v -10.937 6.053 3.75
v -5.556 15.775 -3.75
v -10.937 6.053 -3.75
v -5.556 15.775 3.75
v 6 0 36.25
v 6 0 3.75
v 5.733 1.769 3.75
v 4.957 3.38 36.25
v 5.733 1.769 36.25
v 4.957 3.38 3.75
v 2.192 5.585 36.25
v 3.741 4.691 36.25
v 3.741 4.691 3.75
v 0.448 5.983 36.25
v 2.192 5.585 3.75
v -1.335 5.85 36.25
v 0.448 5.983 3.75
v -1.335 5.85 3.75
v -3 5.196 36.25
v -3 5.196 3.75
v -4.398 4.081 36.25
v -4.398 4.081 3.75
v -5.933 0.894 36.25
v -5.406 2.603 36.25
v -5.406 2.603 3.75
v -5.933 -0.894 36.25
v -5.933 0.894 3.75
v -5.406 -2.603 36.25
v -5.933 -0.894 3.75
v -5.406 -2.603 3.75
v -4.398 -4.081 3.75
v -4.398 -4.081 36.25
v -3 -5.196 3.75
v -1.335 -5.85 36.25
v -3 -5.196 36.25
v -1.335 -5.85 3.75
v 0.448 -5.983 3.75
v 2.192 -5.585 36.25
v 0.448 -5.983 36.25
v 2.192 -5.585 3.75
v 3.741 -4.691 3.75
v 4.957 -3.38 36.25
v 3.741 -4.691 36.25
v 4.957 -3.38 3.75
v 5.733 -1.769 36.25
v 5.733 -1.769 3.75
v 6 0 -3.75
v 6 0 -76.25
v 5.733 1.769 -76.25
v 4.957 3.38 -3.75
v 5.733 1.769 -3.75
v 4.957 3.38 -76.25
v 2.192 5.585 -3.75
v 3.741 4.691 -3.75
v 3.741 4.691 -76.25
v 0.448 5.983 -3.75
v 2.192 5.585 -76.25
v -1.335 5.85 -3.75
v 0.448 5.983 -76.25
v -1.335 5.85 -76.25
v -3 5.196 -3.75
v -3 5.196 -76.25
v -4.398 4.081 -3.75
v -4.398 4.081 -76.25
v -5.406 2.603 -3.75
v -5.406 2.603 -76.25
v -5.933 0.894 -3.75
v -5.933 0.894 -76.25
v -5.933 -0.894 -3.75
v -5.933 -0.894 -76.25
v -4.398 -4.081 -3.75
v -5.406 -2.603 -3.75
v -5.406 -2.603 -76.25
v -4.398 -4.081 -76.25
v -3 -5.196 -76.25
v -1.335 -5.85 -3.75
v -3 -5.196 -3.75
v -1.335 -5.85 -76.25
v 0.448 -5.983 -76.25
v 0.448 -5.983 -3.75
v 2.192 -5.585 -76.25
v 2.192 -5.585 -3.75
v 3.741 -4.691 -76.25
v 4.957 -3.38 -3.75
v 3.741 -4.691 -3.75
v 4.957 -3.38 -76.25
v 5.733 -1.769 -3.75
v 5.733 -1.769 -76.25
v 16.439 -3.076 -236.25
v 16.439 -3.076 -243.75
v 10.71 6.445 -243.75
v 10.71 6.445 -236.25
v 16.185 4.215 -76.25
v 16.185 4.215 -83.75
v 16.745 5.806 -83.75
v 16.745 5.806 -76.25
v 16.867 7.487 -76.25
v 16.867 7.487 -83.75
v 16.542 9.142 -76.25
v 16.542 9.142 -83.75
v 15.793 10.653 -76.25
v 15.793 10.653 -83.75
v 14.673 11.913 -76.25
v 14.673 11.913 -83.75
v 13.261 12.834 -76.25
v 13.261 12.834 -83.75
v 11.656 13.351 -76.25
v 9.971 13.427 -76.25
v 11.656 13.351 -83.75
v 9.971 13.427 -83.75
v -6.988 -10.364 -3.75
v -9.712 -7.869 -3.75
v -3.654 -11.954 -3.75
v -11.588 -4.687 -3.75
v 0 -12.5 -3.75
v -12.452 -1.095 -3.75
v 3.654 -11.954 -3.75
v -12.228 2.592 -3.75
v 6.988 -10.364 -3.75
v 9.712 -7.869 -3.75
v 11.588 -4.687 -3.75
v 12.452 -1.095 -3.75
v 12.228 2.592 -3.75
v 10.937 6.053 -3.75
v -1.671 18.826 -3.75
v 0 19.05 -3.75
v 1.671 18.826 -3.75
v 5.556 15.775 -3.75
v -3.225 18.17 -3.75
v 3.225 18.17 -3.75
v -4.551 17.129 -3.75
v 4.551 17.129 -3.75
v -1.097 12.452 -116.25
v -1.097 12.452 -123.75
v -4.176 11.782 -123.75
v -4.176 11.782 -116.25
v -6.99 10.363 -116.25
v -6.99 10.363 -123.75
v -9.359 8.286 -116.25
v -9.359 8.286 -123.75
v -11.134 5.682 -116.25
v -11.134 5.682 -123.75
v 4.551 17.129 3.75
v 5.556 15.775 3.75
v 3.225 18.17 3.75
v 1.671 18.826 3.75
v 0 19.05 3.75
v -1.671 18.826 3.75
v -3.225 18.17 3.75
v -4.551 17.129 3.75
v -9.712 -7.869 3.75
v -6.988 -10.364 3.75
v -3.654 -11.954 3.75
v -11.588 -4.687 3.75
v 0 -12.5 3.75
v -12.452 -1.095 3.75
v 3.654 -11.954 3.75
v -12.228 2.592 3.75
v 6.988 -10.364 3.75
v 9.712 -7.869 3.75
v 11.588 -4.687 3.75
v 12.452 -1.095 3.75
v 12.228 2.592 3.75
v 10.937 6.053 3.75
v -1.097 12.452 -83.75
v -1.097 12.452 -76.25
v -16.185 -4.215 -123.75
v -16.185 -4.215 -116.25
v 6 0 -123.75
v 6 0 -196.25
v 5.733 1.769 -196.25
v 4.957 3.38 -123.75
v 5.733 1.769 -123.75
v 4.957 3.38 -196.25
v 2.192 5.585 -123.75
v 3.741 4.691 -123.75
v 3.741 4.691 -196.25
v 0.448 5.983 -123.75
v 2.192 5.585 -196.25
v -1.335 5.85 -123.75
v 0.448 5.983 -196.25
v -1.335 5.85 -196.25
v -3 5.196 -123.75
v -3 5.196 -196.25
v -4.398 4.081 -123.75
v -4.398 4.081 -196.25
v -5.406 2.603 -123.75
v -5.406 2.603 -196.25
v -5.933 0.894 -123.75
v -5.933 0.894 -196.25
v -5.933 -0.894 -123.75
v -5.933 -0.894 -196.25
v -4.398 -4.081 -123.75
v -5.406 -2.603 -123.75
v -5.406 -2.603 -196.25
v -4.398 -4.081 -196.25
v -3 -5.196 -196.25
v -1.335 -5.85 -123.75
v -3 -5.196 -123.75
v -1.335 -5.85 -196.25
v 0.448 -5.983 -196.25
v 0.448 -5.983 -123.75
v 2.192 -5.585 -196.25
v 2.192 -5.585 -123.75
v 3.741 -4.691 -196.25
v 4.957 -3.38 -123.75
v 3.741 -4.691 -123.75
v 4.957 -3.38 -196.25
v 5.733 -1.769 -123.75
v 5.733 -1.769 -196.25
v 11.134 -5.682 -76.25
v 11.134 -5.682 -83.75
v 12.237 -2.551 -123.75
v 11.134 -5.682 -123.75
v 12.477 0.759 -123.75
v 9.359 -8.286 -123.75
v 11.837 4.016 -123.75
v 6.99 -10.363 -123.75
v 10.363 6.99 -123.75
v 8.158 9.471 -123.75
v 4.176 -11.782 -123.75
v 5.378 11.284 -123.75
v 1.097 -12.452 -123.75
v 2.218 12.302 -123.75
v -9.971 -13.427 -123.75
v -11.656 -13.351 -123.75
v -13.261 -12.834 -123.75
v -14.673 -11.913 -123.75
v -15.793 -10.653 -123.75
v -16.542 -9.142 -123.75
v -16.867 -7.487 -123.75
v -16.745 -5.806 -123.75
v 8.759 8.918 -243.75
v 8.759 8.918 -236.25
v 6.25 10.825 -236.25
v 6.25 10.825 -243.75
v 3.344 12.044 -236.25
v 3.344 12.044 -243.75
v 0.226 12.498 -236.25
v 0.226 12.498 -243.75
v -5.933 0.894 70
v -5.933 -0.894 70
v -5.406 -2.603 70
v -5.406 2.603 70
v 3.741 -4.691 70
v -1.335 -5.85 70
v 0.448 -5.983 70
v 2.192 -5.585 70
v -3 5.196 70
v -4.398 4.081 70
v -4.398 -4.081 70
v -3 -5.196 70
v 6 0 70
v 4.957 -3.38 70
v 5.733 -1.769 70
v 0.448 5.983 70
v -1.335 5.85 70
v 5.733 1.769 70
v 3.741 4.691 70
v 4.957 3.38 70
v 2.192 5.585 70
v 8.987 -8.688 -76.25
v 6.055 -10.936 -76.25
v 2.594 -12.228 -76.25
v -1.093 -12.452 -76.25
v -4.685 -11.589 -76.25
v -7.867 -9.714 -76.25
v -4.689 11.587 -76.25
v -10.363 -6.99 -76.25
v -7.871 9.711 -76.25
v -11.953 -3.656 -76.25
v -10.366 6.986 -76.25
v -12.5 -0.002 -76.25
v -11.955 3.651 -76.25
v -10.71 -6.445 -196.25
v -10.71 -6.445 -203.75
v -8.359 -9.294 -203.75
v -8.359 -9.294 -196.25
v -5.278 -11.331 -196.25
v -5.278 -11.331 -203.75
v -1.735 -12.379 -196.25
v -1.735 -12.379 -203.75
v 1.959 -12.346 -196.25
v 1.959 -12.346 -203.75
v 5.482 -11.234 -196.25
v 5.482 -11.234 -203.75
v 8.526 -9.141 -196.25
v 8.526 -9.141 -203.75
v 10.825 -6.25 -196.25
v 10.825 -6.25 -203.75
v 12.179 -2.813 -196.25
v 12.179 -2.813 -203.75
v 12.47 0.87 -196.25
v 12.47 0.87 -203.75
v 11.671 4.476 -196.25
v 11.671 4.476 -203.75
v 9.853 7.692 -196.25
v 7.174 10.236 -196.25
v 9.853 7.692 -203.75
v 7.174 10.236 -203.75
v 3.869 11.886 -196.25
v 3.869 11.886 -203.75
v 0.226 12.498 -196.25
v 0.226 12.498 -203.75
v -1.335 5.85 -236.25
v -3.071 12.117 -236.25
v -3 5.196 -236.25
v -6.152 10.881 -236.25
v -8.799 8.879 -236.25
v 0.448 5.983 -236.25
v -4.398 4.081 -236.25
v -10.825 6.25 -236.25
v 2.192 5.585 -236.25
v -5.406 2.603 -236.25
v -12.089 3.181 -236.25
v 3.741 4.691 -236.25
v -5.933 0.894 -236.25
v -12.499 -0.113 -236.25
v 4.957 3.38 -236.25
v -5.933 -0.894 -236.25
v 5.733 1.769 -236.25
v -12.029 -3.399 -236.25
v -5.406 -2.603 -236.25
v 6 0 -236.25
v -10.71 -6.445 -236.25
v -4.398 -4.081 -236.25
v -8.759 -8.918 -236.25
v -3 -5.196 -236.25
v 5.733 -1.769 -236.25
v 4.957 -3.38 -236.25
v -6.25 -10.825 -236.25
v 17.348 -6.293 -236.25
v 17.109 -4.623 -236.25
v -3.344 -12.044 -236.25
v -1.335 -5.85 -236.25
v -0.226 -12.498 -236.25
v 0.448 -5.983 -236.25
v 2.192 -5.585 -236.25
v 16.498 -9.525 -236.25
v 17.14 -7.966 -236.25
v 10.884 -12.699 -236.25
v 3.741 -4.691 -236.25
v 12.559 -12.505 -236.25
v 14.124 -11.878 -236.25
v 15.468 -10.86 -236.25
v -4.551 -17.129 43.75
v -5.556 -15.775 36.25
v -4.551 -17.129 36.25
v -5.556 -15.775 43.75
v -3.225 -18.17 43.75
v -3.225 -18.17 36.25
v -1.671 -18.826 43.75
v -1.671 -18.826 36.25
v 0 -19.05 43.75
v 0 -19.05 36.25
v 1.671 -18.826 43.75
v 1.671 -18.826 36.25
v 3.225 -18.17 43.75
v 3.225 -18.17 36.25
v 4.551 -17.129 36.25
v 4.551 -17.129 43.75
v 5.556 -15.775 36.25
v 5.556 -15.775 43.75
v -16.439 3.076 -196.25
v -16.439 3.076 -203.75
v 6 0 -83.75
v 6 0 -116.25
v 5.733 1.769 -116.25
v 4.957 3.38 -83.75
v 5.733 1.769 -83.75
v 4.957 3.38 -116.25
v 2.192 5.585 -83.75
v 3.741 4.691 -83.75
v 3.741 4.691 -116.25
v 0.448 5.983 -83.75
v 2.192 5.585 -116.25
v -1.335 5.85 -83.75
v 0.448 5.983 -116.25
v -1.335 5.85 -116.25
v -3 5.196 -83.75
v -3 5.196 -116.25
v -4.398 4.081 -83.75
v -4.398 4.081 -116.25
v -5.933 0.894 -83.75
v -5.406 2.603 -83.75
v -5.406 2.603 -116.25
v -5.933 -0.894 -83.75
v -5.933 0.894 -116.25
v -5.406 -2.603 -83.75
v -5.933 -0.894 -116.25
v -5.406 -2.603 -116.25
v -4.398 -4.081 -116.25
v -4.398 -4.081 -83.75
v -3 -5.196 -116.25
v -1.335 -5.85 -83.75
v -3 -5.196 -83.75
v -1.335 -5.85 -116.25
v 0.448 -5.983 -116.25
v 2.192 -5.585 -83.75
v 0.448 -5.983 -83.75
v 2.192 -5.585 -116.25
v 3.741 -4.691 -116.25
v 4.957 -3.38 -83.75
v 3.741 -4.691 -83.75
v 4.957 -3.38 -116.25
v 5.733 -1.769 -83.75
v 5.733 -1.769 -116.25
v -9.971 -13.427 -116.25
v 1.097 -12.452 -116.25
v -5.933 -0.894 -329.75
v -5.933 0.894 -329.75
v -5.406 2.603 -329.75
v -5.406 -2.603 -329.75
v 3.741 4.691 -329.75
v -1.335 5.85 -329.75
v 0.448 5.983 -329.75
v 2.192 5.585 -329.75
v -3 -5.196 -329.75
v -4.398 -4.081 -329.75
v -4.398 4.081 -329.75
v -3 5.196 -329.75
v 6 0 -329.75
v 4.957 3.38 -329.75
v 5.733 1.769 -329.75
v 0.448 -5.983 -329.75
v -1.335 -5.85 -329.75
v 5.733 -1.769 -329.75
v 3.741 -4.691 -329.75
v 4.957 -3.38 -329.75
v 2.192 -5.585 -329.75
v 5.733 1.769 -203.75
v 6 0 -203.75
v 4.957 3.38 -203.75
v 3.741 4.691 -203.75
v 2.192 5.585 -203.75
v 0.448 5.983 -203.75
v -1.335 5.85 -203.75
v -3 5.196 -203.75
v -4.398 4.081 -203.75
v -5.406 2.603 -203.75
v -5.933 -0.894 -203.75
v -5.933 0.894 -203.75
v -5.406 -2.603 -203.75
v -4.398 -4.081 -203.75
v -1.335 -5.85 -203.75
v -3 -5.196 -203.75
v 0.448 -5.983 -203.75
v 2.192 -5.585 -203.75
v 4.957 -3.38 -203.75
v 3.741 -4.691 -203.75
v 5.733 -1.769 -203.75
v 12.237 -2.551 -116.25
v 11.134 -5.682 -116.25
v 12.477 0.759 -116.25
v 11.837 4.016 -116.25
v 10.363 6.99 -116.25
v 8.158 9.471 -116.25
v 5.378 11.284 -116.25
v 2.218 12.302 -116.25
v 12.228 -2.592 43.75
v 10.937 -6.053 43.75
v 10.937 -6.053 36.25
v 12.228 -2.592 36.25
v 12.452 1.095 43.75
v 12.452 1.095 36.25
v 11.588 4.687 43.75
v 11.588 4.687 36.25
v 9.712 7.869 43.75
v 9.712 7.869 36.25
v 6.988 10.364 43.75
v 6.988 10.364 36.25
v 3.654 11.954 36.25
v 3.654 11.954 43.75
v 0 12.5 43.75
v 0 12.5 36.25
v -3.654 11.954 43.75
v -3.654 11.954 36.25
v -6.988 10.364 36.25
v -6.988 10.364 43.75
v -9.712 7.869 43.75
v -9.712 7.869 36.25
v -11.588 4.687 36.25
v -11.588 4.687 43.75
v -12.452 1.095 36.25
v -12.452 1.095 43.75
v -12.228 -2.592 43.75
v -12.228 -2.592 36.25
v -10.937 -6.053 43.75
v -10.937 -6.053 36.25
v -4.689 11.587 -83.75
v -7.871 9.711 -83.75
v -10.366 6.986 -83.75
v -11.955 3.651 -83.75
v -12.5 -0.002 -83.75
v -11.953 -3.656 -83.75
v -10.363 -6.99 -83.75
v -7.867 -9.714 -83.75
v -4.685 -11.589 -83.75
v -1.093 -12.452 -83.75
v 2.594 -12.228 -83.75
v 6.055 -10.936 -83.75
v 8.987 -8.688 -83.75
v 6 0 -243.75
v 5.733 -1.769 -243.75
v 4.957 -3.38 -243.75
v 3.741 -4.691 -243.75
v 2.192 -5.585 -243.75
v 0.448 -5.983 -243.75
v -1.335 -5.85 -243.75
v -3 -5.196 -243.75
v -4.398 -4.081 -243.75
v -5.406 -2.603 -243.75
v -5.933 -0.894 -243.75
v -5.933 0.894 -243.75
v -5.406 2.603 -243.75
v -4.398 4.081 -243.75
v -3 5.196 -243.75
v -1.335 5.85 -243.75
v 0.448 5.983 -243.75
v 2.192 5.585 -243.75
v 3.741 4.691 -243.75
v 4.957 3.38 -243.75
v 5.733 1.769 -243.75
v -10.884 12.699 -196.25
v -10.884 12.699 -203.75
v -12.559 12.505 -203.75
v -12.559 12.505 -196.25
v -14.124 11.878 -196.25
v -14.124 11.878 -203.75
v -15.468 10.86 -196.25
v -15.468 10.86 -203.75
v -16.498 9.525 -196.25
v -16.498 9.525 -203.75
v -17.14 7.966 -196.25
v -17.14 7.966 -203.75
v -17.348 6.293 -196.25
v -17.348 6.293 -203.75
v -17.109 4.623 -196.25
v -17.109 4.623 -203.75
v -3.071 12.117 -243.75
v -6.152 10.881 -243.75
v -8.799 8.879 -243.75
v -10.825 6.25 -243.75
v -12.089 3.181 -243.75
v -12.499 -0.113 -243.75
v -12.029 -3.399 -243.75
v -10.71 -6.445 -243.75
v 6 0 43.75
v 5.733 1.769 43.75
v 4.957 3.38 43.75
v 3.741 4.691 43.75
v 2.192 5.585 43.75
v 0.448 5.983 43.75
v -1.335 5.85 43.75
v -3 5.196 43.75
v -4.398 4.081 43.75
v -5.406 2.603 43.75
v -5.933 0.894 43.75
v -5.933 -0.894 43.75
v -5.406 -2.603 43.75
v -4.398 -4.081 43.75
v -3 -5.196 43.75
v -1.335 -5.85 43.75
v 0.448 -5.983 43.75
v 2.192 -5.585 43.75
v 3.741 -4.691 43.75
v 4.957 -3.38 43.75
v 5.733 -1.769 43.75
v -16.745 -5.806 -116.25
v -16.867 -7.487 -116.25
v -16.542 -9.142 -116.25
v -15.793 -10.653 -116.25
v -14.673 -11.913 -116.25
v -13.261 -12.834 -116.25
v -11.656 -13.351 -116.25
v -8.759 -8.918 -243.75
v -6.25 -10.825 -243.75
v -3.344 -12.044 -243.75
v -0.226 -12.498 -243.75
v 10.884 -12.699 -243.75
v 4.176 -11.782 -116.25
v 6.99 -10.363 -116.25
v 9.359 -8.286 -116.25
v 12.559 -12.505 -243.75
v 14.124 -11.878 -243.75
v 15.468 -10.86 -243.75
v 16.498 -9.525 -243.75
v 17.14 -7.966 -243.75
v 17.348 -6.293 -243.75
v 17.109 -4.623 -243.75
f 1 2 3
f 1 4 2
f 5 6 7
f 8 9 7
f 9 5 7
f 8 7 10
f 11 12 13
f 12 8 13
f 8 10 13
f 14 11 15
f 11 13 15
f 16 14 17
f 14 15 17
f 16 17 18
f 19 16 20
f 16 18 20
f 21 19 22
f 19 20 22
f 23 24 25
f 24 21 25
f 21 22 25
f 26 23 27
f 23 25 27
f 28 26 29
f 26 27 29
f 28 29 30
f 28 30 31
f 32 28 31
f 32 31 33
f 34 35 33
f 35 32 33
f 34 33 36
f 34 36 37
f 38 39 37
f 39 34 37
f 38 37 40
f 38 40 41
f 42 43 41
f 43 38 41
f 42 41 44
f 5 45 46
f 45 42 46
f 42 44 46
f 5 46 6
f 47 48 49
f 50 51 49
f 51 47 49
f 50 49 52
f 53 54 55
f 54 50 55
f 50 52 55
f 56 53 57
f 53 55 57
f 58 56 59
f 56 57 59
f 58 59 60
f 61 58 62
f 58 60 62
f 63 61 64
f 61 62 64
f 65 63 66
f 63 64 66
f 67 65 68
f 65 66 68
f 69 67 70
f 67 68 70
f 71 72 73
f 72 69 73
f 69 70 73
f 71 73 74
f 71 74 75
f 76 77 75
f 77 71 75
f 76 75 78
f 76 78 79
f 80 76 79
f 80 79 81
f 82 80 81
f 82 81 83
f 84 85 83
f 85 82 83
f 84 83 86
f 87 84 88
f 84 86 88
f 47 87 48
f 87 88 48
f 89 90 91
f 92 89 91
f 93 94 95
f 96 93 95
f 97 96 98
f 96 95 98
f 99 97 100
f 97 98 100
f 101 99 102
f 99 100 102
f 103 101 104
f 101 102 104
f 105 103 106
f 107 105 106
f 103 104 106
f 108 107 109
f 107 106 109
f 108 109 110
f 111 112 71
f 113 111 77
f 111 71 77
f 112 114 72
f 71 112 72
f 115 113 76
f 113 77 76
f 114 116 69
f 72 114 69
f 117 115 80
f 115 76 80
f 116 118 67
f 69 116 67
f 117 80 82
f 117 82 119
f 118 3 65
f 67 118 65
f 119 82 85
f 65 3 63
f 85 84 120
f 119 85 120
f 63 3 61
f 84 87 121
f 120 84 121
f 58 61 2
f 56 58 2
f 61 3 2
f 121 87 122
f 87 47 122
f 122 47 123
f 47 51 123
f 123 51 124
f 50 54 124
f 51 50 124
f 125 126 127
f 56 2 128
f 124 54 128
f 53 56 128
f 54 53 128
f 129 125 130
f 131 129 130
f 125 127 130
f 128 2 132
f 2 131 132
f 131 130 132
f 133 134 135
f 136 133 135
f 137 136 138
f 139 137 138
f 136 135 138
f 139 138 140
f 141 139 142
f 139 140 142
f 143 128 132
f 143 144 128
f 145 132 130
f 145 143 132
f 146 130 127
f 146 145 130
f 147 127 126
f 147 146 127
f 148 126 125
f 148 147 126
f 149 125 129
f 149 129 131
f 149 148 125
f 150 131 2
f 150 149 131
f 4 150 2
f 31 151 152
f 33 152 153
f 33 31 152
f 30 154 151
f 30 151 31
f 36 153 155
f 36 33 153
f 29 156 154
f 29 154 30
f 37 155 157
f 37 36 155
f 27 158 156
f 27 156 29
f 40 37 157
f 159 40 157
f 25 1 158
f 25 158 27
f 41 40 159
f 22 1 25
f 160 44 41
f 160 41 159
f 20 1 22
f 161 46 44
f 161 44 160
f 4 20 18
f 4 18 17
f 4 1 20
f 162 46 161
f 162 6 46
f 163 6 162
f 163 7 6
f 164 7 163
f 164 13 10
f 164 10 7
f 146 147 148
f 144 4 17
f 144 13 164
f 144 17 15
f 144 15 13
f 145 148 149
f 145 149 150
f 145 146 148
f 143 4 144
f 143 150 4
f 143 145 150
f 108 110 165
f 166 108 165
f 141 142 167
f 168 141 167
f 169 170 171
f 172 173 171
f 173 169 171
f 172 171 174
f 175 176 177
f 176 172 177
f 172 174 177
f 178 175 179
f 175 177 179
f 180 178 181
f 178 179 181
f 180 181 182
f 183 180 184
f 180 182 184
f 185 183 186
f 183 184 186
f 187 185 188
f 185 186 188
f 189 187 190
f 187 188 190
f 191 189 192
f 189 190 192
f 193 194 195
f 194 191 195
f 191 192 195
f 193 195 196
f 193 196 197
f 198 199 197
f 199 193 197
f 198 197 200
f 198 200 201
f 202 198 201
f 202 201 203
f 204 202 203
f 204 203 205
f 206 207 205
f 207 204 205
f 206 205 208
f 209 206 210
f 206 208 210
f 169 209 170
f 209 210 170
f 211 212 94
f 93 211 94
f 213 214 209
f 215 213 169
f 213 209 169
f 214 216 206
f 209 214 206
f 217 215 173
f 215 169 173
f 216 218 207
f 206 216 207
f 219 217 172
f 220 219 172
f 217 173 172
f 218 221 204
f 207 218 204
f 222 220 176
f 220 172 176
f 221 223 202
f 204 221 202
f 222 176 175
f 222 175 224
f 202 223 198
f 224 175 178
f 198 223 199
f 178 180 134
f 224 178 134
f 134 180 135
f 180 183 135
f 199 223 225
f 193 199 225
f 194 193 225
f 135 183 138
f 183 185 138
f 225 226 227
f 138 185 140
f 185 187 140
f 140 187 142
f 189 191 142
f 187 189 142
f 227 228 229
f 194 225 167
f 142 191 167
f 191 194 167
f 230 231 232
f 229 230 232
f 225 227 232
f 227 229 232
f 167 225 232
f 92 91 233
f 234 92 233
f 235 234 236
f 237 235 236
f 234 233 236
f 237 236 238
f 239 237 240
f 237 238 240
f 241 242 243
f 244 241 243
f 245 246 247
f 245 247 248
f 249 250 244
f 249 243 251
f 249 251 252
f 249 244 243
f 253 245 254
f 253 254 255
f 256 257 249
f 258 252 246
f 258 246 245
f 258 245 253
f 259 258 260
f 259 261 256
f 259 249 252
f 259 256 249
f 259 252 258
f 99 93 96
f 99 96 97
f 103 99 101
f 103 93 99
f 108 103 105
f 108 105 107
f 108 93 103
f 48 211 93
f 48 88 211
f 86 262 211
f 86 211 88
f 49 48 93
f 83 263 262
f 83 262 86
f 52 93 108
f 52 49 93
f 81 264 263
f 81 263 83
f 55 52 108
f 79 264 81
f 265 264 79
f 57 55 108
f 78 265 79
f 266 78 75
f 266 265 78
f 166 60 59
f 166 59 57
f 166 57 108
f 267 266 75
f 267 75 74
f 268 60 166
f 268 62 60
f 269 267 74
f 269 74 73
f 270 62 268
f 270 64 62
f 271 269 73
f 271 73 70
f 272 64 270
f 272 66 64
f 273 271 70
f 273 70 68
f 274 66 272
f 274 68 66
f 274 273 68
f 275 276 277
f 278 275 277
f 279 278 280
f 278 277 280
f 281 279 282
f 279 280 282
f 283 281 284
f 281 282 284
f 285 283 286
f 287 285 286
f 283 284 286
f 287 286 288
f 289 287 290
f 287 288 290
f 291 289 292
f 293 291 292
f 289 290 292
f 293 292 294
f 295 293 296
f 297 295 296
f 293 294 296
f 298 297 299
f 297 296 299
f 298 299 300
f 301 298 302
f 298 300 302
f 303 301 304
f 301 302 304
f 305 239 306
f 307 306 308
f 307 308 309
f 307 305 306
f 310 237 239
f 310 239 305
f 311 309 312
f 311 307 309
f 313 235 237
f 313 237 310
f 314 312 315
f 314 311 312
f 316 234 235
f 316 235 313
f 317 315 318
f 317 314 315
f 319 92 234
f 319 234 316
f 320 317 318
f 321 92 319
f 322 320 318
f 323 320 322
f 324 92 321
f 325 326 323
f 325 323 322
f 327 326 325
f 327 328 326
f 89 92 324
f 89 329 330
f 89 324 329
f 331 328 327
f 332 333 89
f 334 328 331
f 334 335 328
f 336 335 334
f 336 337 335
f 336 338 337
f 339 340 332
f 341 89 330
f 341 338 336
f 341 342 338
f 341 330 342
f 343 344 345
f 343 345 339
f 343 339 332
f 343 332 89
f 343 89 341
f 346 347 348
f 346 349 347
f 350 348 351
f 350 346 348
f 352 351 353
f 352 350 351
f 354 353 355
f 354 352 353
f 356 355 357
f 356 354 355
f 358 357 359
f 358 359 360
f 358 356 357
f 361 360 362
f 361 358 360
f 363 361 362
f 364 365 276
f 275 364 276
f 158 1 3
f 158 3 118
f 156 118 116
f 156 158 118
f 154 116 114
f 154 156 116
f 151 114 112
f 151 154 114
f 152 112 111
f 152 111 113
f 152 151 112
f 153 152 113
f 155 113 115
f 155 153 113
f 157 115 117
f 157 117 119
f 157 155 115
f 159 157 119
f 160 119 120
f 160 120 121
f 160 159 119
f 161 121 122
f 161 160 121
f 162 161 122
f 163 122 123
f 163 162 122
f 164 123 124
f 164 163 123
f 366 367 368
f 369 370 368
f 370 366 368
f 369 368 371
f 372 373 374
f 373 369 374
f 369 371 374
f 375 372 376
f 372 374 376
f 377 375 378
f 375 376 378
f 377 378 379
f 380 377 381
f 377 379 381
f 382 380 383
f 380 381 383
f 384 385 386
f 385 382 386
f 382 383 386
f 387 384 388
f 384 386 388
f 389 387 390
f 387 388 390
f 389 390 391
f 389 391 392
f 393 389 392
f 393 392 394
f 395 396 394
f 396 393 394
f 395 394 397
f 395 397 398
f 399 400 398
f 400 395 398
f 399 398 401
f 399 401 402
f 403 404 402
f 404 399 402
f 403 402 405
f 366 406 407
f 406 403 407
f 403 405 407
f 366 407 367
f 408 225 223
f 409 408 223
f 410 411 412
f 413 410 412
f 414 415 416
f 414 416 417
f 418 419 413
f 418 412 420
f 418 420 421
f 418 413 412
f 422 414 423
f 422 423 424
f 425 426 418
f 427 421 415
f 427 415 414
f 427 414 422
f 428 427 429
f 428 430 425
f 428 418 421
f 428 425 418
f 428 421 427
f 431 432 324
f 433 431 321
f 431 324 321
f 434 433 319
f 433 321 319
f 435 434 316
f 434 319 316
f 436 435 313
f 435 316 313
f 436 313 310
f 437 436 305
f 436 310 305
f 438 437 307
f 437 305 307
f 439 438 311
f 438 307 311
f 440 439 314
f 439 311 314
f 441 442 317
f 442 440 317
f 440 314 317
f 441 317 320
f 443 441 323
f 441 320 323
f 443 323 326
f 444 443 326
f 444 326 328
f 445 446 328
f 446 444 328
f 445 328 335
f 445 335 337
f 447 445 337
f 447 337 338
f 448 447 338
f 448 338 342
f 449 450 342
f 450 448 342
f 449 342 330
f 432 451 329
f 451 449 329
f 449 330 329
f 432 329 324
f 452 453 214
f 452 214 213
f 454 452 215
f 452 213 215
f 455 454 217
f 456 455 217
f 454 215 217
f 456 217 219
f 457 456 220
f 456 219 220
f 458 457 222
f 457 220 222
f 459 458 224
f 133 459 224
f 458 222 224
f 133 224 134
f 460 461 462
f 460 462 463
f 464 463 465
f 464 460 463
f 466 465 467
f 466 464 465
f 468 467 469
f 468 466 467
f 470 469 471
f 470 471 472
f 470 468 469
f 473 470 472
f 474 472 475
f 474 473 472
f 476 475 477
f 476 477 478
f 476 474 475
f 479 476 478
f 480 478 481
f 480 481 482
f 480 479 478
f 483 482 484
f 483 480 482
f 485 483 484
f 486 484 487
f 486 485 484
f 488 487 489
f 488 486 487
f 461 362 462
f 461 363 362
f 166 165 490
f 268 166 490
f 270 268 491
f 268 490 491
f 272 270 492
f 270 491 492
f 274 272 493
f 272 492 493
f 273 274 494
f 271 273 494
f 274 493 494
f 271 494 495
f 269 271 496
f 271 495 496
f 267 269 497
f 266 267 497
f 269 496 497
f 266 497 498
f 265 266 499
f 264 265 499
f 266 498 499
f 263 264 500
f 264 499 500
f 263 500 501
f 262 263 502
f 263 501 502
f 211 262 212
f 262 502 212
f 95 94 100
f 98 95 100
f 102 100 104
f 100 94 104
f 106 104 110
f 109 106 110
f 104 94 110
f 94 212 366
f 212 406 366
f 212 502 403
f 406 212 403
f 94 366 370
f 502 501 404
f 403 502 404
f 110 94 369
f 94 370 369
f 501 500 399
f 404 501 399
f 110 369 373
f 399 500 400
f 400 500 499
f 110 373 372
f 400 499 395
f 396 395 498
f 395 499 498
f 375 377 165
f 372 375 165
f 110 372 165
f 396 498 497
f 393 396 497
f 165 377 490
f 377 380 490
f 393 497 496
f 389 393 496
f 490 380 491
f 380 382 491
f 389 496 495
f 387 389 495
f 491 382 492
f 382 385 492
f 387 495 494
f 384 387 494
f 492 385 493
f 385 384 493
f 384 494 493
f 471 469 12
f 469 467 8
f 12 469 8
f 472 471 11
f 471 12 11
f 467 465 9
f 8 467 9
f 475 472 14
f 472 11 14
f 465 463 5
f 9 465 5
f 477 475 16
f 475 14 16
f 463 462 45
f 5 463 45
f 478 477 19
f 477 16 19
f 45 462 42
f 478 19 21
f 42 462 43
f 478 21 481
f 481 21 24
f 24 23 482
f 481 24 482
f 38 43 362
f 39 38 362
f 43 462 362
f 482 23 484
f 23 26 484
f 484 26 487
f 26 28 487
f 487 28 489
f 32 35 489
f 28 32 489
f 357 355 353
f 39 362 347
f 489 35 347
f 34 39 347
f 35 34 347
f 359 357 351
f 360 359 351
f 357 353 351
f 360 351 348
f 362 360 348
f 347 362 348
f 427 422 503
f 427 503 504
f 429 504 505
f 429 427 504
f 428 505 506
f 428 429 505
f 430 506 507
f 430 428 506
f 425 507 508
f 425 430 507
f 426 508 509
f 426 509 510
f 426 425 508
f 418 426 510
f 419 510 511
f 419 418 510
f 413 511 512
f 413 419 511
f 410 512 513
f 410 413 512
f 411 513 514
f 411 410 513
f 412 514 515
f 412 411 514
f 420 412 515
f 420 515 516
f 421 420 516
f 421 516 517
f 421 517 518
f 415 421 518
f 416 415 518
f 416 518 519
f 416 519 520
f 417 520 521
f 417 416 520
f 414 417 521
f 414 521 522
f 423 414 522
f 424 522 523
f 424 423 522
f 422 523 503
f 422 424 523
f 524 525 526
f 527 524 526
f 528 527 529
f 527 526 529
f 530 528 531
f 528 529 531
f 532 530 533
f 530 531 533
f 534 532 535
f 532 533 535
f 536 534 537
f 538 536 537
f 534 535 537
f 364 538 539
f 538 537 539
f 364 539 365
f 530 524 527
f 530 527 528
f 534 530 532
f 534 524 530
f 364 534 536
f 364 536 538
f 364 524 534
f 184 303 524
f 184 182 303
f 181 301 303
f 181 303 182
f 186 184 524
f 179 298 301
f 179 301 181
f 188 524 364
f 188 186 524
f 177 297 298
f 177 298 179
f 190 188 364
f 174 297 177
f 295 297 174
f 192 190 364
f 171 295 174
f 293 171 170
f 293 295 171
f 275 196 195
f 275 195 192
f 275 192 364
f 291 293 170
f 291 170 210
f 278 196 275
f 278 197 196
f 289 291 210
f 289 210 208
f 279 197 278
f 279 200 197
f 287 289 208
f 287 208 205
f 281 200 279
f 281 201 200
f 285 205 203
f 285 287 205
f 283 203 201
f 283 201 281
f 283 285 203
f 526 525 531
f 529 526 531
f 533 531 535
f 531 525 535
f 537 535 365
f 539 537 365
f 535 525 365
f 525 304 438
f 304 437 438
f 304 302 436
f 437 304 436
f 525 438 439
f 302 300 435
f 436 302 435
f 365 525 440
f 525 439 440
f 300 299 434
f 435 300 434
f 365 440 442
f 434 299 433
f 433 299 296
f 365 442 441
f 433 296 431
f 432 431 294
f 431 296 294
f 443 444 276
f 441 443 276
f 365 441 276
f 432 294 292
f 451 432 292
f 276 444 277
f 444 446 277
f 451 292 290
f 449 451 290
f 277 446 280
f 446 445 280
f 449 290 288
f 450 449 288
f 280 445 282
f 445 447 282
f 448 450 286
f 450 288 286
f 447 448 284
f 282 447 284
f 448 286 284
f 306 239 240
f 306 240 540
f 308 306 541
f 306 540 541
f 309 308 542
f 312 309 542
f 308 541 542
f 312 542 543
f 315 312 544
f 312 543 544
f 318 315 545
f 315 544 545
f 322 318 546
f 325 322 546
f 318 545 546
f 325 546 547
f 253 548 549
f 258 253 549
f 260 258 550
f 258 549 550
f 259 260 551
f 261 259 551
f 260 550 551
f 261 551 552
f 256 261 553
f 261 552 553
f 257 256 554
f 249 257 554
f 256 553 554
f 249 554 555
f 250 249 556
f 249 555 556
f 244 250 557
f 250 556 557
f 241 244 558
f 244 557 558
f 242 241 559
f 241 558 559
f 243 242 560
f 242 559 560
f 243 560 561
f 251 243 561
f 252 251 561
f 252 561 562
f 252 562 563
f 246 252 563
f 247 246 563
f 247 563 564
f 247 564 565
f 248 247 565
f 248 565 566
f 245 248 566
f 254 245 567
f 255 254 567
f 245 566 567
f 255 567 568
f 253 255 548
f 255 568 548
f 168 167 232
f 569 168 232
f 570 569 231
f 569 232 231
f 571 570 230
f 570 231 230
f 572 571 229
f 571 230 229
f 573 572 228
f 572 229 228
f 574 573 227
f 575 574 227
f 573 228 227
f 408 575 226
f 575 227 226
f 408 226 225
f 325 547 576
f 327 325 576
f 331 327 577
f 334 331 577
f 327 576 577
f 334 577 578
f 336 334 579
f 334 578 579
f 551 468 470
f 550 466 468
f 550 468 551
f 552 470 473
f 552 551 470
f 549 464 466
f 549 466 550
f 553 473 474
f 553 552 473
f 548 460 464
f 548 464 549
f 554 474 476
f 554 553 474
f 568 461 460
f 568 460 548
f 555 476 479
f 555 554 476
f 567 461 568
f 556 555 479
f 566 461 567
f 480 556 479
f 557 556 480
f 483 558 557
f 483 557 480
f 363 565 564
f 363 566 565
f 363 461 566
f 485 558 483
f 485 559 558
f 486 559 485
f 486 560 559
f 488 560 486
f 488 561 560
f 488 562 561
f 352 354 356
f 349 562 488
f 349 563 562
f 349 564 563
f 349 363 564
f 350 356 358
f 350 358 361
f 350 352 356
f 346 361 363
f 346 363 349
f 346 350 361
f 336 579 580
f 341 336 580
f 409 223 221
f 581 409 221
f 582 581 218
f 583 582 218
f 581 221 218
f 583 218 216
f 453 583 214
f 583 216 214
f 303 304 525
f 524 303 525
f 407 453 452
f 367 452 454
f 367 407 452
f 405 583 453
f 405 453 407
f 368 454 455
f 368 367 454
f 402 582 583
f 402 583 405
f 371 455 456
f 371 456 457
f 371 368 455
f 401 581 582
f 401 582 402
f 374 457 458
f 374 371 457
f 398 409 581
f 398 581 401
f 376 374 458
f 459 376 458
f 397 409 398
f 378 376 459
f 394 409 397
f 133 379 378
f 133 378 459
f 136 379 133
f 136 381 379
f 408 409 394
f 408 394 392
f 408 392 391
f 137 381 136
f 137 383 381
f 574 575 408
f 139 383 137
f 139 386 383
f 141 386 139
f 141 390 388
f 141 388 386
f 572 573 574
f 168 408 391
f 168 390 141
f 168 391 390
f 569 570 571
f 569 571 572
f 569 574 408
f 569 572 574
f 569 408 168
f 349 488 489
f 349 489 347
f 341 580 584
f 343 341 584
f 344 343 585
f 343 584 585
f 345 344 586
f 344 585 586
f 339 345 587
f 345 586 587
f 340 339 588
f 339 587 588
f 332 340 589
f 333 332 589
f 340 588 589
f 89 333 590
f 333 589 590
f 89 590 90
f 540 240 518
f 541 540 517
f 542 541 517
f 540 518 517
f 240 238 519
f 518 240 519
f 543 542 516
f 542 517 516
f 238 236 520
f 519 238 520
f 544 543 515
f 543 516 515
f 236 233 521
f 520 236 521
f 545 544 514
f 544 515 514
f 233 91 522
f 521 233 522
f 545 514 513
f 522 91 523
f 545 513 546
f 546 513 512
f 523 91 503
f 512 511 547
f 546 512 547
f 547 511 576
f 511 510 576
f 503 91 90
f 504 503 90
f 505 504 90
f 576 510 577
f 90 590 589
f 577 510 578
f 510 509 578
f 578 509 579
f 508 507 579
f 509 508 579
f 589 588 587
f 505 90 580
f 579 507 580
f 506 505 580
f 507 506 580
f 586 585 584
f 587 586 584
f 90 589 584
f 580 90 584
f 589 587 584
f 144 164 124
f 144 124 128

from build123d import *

# Parameters (mm, degrees)
SALIENTE_EXTRUIR1_DEPTH      = 3.75
S_LIDO_MOVER_COPIAR2_ANGLE   = 180
S_LIDO_MOVER_COPIAR4_START   = -243.75
S_LIDO_MOVER_COPIAR4_DEPTH   = 7.5
S_LIDO_MOVER_COPIAR4_START_2 = -203.75
S_LIDO_MOVER_COPIAR4_2_DEPTH = 7.5
S_LIDO_MOVER_COPIAR4_START_3 = -123.75
S_LIDO_MOVER_COPIAR4_3_DEPTH = 7.5
S_LIDO_MOVER_COPIAR4_START_4 = -83.75
S_LIDO_MOVER_COPIAR4_4_DEPTH = 7.5
S_LIDO_MOVER_COPIAR5_ANGLE   = 124
S_LIDO_MOVER_COPIAR6_ANGLE   = 120
CROQUIS5_R                   = 6
SALIENTE_EXTRUIR4_DEPTH      = 275
SALIENTE_EXTRUIR5_START      = 86
CROQUIS6_R                   = 6
SALIENTE_EXTRUIR5_DEPTH      = 86
CROQUIS7_R                   = 6
SALIENTE_EXTRUIR6_DEPTH      = 26.25


# Read off the part's stored shape, not the designer's step: Sólido-Mover/Copiar4
with BuildPart() as part:
    # Croquis1 → Saliente-Extruir1 (new, symmetric)
    with BuildSketch(Plane.XY):
        with BuildLine():
            Line((-5.555796523, 15.775), (-10.936607328, 6.053149606))
            ThreePointArc((-10.936607328, 6.053149606), (0, -12.5), (10.936607328, 6.053149606))
            Line((10.936607328, 6.053149606), (5.555796523, 15.775))
            ThreePointArc((5.555796523, 15.775), (0, 19.05), (-5.555796523, 15.775))
        make_face()
    extrude(amount=SALIENTE_EXTRUIR1_DEPTH, both=True)


with BuildPart() as body_2:
    # Sólido-Mover/Copiar1: copy of part
    add(part.part.moved(Location((0, 0, 40))))


with BuildPart() as body_2_1:
    # Sólido-Mover/Copiar2: moved
    add(body_2.part.rotate(Axis((0, 0, 0), (0, 0, 1)), S_LIDO_MOVER_COPIAR2_ANGLE))


with BuildPart() as body_3:
    # Sólido-Mover/Copiar4 outline → Sólido-Mover/Copiar4 (new body)
    with BuildSketch(Plane.XY.offset(S_LIDO_MOVER_COPIAR4_START)):
        with BuildLine():
            ThreePointArc((5.555796523, 15.775), (0, 19.05), (-5.555796523, 15.775))
            Line((-5.555796523, 15.775), (-10.936607328, 6.053149606))
            ThreePointArc((-10.936607328, 6.053149606), (-12.5, 0), (-10.936607328, -6.053149606))
            ThreePointArc((-10.936607328, -6.053149606), (0, -12.5), (10.936607328, -6.053149606))
            ThreePointArc((10.936607328, -6.053149606), (12.5, 0), (10.936607328, 6.053149606))
            Line((10.936607328, 6.053149606), (5.555796523, 15.775))
        make_face()
    extrude(amount=S_LIDO_MOVER_COPIAR4_DEPTH)


with BuildPart() as body_4:
    # S_lido-Mover_Copiar4 2 outline → S_lido-Mover_Copiar4 2 (new body)
    with BuildSketch(Plane.XY.offset(S_LIDO_MOVER_COPIAR4_START_2)):
        with BuildLine():
            Line((-10.936607328, -6.053149606), (-5.555796523, -15.775))
            ThreePointArc((-5.555796523, -15.775), (0, -19.05), (5.555796523, -15.775))
            Line((5.555796523, -15.775), (10.936607328, -6.053149606))
            ThreePointArc((10.936607328, -6.053149606), (0, 12.5), (-10.936607328, -6.053149606))
        make_face()
    extrude(amount=S_LIDO_MOVER_COPIAR4_2_DEPTH)


with BuildPart() as body_5:
    # S_lido-Mover_Copiar4 3 outline → S_lido-Mover_Copiar4 3 (new body)
    with BuildSketch(Plane.XY.offset(S_LIDO_MOVER_COPIAR4_START_3)):
        with BuildLine():
            ThreePointArc((5.555796523, 15.775), (0, 19.05), (-5.555796523, 15.775))
            Line((-5.555796523, 15.775), (-10.936607328, 6.053149606))
            ThreePointArc((-10.936607328, 6.053149606), (-12.5, 0), (-10.936607328, -6.053149606))
            ThreePointArc((-10.936607328, -6.053149606), (0, -12.5), (10.936607328, -6.053149606))
            ThreePointArc((10.936607328, -6.053149606), (12.5, 0), (10.936607328, 6.053149606))
            Line((10.936607328, 6.053149606), (5.555796523, 15.775))
        make_face()
    extrude(amount=S_LIDO_MOVER_COPIAR4_3_DEPTH)


with BuildPart() as body_6:
    # S_lido-Mover_Copiar4 4 outline → S_lido-Mover_Copiar4 4 (new body)
    with BuildSketch(Plane.XY.offset(S_LIDO_MOVER_COPIAR4_START_4)):
        with BuildLine():
            Line((-10.936607328, -6.053149606), (-5.555796523, -15.775))
            ThreePointArc((-5.555796523, -15.775), (0, -19.05), (5.555796523, -15.775))
            Line((5.555796523, -15.775), (10.936607328, -6.053149606))
            ThreePointArc((10.936607328, -6.053149606), (0, 12.5), (-10.936607328, -6.053149606))
        make_face()
    extrude(amount=S_LIDO_MOVER_COPIAR4_4_DEPTH)


with BuildPart() as body_6_1:
    # Sólido-Mover/Copiar5: moved
    add(body_6.part.rotate(Axis((0, 0, 0), (0, 0, 1)), S_LIDO_MOVER_COPIAR5_ANGLE))


with BuildPart() as body_5_1:
    # Sólido-Mover/Copiar5: moved
    add(body_5.part.rotate(Axis((0, 0, 0), (0, 0, 1)), S_LIDO_MOVER_COPIAR5_ANGLE))


with BuildPart() as body_3_1:
    # Sólido-Mover/Copiar6: moved
    add(body_3.part.rotate(Axis((0, 0, 0), (0, 0, -1)), S_LIDO_MOVER_COPIAR6_ANGLE))


with BuildPart() as body_4_1:
    # Sólido-Mover/Copiar6: moved
    add(body_4.part.rotate(Axis((0, 0, 0), (0, 0, -1)), S_LIDO_MOVER_COPIAR6_ANGLE))


with BuildPart() as part_1:
    add(part.part)

    add(body_2_1.part)  # Saliente-Extruir4 merges body 2

    add(body_3_1.part)  # Saliente-Extruir4 merges body 3

    add(body_4_1.part)  # Saliente-Extruir4 merges body 4

    add(body_5_1.part)  # Saliente-Extruir4 merges body 5

    add(body_6_1.part)  # Saliente-Extruir4 merges body 6
    # Croquis5 → Saliente-Extruir4 (add)
    with BuildSketch(Plane.XY.offset(-236.25)):
        Circle(CROQUIS5_R)
    extrude(amount=SALIENTE_EXTRUIR4_DEPTH)

    # Croquis6 → Saliente-Extruir5 (add)
    with BuildSketch(Plane(origin=(0, 0, -243.75), x_dir=(-1, 0, 0), z_dir=(0, 0, -1)).offset(SALIENTE_EXTRUIR5_START)):
        with Locations(Location((0, 0, 0), (0, 0, 180))):
            Circle(CROQUIS6_R)
    extrude(amount=-SALIENTE_EXTRUIR5_DEPTH)

    # Croquis7 → Saliente-Extruir6 (add)
    with BuildSketch(Plane.XY.offset(43.75)):
        Circle(CROQUIS7_R)
    extrude(amount=SALIENTE_EXTRUIR6_DEPTH)


solid = part_1.part
